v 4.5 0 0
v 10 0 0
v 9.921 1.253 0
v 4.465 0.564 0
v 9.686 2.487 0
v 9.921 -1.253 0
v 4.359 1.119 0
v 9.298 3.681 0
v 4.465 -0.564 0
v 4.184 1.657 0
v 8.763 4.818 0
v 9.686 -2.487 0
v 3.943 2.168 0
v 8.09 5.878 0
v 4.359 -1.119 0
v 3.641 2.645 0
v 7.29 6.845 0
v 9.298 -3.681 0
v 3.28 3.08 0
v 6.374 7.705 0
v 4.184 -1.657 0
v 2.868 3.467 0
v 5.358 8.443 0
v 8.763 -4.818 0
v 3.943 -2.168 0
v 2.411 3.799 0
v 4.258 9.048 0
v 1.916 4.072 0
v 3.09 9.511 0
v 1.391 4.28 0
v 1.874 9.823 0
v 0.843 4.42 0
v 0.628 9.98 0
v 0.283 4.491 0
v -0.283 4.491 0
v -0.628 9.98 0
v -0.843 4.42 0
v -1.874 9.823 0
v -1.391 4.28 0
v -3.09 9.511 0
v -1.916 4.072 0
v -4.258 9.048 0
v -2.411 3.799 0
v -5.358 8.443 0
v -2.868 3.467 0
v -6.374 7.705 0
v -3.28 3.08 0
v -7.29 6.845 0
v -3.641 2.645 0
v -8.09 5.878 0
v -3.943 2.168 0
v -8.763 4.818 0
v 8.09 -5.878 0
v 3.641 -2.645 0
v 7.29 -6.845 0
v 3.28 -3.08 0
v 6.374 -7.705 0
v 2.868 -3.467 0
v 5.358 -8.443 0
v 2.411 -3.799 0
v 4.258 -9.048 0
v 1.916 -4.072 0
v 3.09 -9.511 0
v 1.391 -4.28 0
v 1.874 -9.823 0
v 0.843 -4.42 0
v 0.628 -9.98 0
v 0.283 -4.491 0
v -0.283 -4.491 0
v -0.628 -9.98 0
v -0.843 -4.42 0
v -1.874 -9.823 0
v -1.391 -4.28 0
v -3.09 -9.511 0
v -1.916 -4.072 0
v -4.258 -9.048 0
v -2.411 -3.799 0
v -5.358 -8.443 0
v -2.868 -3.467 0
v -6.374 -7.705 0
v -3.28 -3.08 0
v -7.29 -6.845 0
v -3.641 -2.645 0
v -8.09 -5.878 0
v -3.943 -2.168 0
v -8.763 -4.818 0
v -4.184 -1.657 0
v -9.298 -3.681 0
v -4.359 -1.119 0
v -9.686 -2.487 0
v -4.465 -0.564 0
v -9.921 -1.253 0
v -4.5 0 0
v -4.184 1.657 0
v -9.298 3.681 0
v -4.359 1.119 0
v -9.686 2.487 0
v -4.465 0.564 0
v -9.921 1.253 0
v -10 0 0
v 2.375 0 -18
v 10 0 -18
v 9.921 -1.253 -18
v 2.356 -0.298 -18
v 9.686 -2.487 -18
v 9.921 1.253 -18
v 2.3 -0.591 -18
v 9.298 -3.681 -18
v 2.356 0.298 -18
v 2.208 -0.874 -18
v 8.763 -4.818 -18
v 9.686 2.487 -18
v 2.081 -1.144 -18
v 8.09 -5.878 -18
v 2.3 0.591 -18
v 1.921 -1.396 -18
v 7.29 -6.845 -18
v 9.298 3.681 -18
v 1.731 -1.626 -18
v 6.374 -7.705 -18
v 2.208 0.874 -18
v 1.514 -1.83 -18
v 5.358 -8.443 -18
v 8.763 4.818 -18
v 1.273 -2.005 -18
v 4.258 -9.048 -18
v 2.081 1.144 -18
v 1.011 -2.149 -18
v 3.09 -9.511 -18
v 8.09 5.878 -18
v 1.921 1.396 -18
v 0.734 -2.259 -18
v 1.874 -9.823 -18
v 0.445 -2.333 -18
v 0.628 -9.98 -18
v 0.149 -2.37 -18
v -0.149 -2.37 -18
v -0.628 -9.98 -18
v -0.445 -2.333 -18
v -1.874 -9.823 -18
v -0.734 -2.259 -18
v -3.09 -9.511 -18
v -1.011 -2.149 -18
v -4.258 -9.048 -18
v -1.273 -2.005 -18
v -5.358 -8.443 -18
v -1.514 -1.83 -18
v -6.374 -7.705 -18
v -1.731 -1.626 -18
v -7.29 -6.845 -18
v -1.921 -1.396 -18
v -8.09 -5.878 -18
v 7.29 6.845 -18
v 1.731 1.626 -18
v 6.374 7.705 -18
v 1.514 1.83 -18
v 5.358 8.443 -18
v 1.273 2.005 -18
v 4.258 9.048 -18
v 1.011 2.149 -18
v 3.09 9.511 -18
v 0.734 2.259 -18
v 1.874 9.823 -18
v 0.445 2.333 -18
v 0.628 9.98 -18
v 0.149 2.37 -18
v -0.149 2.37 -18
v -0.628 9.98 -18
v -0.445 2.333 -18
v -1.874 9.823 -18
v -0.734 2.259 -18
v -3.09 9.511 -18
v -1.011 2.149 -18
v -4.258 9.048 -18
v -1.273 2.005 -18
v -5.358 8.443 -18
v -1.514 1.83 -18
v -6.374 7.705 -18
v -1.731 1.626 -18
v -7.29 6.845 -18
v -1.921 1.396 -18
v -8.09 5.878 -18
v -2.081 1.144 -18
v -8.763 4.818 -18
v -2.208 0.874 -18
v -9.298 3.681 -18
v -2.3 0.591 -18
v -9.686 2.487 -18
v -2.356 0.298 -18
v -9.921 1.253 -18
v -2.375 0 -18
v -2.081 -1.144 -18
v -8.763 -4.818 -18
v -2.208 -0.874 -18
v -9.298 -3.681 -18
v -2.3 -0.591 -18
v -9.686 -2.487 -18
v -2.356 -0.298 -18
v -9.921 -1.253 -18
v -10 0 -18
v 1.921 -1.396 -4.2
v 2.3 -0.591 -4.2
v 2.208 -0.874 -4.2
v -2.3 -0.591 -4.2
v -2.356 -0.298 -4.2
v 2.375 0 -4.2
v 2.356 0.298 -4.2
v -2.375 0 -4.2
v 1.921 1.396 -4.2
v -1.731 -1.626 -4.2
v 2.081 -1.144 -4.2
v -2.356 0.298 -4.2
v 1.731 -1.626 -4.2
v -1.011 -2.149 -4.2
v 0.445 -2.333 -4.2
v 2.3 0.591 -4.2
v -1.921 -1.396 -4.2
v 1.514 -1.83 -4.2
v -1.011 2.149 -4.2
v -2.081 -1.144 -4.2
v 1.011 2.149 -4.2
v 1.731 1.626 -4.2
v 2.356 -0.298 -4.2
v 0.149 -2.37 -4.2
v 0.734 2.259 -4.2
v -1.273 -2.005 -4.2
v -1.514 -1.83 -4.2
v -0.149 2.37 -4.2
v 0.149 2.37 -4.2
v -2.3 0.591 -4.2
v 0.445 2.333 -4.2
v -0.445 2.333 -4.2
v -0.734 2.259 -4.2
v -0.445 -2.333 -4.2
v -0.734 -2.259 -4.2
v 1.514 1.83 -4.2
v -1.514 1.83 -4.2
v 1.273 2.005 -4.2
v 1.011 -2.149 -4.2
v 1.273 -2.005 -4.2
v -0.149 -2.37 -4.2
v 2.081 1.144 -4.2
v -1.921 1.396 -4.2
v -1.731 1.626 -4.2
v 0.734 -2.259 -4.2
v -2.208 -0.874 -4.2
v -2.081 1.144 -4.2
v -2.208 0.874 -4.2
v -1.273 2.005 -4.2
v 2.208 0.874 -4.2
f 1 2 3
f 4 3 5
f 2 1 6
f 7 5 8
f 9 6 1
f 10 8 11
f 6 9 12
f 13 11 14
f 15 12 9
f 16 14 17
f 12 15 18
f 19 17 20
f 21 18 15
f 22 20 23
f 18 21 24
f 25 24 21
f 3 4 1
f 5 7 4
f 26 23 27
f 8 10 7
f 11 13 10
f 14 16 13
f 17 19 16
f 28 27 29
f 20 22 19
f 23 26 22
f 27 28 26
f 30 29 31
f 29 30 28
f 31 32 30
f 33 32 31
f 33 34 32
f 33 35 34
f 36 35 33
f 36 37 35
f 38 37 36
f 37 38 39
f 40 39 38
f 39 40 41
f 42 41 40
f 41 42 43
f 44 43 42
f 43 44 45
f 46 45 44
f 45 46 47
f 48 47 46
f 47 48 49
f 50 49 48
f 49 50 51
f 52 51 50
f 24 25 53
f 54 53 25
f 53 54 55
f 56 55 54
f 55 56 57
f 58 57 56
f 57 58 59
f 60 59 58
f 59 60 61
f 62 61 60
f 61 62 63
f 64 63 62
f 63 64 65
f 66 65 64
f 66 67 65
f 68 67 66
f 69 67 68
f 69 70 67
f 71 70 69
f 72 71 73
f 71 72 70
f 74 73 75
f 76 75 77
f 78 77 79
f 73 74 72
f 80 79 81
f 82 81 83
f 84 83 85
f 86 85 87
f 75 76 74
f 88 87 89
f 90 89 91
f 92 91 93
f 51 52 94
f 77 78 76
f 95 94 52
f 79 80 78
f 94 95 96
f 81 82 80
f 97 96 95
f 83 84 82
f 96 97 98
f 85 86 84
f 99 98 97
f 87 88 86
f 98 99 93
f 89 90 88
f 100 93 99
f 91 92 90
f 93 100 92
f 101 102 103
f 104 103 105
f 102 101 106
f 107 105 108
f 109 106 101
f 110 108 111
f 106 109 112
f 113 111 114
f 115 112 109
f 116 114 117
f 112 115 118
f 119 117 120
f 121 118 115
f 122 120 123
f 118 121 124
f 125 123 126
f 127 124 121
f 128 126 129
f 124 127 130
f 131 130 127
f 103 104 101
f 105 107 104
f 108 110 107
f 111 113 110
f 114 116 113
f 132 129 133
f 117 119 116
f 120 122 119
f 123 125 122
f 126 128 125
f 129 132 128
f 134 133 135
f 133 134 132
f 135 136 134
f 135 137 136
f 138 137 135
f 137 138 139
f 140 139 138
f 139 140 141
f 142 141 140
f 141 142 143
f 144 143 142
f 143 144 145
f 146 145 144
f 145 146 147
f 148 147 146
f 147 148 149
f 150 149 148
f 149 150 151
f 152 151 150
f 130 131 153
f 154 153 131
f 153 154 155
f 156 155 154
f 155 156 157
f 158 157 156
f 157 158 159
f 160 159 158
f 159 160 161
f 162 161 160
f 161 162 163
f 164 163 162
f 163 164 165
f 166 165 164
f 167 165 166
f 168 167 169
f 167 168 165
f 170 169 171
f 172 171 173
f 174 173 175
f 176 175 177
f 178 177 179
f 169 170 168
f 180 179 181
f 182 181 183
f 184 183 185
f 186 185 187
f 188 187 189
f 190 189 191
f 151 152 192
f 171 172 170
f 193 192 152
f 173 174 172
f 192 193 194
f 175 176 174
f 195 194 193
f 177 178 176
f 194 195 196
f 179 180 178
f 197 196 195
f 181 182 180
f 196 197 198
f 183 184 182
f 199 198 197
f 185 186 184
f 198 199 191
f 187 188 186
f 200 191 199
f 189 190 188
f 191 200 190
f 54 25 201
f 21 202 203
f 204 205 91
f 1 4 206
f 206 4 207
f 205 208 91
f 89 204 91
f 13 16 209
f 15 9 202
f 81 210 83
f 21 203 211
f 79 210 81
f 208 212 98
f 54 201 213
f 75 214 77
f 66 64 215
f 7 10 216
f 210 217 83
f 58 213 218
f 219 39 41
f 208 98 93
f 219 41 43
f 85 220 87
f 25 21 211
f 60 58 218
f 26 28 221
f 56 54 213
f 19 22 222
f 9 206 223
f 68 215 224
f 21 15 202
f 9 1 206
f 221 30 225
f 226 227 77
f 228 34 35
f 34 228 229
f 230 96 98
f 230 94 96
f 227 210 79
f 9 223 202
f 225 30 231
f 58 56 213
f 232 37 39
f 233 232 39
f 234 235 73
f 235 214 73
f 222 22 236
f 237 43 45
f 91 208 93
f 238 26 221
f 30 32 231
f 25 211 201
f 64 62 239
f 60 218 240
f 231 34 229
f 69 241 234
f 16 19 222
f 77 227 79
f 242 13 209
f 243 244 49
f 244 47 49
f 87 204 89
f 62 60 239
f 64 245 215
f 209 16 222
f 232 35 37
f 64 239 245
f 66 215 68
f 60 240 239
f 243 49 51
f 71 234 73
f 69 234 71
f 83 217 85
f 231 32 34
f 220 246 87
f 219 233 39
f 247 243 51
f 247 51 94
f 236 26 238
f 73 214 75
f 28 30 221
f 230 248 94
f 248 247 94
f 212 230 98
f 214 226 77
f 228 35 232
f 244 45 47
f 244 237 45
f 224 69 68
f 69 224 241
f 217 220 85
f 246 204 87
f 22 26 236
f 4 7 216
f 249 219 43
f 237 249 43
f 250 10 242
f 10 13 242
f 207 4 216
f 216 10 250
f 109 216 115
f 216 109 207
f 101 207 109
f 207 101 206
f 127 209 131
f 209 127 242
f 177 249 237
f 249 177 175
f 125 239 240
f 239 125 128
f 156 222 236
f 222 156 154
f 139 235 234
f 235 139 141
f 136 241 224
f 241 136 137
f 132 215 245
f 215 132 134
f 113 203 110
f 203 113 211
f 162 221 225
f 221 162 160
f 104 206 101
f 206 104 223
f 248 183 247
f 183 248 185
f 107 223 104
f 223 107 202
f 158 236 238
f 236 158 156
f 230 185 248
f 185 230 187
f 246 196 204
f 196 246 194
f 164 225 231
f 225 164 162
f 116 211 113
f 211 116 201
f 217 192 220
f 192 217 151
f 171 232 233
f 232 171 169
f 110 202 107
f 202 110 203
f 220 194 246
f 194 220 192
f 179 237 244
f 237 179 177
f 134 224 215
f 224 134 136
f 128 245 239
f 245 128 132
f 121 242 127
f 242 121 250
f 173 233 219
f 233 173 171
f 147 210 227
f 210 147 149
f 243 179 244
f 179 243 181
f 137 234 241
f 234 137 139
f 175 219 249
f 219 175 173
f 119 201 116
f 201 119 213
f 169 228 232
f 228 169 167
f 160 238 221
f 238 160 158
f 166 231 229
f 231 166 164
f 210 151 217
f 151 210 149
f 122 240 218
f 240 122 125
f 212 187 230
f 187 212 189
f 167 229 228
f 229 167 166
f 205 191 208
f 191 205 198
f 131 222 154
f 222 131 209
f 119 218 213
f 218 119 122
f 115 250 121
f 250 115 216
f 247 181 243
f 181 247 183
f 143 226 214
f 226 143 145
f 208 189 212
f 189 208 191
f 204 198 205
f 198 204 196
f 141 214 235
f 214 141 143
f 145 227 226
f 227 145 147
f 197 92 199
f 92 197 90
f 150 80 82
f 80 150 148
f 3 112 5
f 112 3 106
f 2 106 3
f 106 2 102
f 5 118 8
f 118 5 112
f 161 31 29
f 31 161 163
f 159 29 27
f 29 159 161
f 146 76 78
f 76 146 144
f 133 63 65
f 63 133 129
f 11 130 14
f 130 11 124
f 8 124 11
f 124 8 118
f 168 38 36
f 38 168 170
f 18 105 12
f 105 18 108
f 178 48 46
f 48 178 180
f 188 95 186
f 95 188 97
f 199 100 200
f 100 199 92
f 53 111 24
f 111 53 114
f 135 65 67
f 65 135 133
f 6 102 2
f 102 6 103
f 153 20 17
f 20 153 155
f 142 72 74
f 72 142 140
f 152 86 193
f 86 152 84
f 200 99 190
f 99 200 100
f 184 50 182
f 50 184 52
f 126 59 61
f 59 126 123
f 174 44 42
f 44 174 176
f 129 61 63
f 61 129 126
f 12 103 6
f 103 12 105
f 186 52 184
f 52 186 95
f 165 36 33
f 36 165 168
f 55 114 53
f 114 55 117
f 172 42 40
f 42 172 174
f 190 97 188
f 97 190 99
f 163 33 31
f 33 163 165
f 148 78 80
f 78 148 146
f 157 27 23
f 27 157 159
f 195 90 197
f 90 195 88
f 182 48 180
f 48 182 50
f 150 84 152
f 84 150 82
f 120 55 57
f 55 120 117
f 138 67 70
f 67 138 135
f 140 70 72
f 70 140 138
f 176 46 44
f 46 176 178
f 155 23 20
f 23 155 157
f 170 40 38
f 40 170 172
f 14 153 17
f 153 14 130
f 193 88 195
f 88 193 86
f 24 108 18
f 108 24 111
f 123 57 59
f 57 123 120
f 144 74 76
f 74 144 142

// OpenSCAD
$fn = 50;


difference() {
	union() {
		translate(v = [0, 0, -18.0000000000]) {
			cylinder(h = 18, r = 10.0000000000);
		}
		cylinder(h = 0, r = 20.0000000000);
	}
	union() {
		translate(v = [0, 0, 0]) {
			rotate(a = [0, 0, 0]) {
				difference() {
					union() {
						#translate(v = [0, 0, -18.0000000000]) {
							cylinder(h = 18, r = 2.2500000000);
						}
						#translate(v = [0, 0, -4.2000000000]) {
							cylinder(h = 4.2000000000, r = 10.0000000000, r1 = 2.3750000000, r2 = 4.5000000000);
						}
						#translate(v = [0, 0, -18.0000000000]) {
							cylinder(h = 18, r = 2.3750000000);
						}
						#translate(v = [0, 0, -18.0000000000]) {
							cylinder(h = 18, r = 2.2500000000);
						}
					}
					union();
				}
			}
		}
	}
}
